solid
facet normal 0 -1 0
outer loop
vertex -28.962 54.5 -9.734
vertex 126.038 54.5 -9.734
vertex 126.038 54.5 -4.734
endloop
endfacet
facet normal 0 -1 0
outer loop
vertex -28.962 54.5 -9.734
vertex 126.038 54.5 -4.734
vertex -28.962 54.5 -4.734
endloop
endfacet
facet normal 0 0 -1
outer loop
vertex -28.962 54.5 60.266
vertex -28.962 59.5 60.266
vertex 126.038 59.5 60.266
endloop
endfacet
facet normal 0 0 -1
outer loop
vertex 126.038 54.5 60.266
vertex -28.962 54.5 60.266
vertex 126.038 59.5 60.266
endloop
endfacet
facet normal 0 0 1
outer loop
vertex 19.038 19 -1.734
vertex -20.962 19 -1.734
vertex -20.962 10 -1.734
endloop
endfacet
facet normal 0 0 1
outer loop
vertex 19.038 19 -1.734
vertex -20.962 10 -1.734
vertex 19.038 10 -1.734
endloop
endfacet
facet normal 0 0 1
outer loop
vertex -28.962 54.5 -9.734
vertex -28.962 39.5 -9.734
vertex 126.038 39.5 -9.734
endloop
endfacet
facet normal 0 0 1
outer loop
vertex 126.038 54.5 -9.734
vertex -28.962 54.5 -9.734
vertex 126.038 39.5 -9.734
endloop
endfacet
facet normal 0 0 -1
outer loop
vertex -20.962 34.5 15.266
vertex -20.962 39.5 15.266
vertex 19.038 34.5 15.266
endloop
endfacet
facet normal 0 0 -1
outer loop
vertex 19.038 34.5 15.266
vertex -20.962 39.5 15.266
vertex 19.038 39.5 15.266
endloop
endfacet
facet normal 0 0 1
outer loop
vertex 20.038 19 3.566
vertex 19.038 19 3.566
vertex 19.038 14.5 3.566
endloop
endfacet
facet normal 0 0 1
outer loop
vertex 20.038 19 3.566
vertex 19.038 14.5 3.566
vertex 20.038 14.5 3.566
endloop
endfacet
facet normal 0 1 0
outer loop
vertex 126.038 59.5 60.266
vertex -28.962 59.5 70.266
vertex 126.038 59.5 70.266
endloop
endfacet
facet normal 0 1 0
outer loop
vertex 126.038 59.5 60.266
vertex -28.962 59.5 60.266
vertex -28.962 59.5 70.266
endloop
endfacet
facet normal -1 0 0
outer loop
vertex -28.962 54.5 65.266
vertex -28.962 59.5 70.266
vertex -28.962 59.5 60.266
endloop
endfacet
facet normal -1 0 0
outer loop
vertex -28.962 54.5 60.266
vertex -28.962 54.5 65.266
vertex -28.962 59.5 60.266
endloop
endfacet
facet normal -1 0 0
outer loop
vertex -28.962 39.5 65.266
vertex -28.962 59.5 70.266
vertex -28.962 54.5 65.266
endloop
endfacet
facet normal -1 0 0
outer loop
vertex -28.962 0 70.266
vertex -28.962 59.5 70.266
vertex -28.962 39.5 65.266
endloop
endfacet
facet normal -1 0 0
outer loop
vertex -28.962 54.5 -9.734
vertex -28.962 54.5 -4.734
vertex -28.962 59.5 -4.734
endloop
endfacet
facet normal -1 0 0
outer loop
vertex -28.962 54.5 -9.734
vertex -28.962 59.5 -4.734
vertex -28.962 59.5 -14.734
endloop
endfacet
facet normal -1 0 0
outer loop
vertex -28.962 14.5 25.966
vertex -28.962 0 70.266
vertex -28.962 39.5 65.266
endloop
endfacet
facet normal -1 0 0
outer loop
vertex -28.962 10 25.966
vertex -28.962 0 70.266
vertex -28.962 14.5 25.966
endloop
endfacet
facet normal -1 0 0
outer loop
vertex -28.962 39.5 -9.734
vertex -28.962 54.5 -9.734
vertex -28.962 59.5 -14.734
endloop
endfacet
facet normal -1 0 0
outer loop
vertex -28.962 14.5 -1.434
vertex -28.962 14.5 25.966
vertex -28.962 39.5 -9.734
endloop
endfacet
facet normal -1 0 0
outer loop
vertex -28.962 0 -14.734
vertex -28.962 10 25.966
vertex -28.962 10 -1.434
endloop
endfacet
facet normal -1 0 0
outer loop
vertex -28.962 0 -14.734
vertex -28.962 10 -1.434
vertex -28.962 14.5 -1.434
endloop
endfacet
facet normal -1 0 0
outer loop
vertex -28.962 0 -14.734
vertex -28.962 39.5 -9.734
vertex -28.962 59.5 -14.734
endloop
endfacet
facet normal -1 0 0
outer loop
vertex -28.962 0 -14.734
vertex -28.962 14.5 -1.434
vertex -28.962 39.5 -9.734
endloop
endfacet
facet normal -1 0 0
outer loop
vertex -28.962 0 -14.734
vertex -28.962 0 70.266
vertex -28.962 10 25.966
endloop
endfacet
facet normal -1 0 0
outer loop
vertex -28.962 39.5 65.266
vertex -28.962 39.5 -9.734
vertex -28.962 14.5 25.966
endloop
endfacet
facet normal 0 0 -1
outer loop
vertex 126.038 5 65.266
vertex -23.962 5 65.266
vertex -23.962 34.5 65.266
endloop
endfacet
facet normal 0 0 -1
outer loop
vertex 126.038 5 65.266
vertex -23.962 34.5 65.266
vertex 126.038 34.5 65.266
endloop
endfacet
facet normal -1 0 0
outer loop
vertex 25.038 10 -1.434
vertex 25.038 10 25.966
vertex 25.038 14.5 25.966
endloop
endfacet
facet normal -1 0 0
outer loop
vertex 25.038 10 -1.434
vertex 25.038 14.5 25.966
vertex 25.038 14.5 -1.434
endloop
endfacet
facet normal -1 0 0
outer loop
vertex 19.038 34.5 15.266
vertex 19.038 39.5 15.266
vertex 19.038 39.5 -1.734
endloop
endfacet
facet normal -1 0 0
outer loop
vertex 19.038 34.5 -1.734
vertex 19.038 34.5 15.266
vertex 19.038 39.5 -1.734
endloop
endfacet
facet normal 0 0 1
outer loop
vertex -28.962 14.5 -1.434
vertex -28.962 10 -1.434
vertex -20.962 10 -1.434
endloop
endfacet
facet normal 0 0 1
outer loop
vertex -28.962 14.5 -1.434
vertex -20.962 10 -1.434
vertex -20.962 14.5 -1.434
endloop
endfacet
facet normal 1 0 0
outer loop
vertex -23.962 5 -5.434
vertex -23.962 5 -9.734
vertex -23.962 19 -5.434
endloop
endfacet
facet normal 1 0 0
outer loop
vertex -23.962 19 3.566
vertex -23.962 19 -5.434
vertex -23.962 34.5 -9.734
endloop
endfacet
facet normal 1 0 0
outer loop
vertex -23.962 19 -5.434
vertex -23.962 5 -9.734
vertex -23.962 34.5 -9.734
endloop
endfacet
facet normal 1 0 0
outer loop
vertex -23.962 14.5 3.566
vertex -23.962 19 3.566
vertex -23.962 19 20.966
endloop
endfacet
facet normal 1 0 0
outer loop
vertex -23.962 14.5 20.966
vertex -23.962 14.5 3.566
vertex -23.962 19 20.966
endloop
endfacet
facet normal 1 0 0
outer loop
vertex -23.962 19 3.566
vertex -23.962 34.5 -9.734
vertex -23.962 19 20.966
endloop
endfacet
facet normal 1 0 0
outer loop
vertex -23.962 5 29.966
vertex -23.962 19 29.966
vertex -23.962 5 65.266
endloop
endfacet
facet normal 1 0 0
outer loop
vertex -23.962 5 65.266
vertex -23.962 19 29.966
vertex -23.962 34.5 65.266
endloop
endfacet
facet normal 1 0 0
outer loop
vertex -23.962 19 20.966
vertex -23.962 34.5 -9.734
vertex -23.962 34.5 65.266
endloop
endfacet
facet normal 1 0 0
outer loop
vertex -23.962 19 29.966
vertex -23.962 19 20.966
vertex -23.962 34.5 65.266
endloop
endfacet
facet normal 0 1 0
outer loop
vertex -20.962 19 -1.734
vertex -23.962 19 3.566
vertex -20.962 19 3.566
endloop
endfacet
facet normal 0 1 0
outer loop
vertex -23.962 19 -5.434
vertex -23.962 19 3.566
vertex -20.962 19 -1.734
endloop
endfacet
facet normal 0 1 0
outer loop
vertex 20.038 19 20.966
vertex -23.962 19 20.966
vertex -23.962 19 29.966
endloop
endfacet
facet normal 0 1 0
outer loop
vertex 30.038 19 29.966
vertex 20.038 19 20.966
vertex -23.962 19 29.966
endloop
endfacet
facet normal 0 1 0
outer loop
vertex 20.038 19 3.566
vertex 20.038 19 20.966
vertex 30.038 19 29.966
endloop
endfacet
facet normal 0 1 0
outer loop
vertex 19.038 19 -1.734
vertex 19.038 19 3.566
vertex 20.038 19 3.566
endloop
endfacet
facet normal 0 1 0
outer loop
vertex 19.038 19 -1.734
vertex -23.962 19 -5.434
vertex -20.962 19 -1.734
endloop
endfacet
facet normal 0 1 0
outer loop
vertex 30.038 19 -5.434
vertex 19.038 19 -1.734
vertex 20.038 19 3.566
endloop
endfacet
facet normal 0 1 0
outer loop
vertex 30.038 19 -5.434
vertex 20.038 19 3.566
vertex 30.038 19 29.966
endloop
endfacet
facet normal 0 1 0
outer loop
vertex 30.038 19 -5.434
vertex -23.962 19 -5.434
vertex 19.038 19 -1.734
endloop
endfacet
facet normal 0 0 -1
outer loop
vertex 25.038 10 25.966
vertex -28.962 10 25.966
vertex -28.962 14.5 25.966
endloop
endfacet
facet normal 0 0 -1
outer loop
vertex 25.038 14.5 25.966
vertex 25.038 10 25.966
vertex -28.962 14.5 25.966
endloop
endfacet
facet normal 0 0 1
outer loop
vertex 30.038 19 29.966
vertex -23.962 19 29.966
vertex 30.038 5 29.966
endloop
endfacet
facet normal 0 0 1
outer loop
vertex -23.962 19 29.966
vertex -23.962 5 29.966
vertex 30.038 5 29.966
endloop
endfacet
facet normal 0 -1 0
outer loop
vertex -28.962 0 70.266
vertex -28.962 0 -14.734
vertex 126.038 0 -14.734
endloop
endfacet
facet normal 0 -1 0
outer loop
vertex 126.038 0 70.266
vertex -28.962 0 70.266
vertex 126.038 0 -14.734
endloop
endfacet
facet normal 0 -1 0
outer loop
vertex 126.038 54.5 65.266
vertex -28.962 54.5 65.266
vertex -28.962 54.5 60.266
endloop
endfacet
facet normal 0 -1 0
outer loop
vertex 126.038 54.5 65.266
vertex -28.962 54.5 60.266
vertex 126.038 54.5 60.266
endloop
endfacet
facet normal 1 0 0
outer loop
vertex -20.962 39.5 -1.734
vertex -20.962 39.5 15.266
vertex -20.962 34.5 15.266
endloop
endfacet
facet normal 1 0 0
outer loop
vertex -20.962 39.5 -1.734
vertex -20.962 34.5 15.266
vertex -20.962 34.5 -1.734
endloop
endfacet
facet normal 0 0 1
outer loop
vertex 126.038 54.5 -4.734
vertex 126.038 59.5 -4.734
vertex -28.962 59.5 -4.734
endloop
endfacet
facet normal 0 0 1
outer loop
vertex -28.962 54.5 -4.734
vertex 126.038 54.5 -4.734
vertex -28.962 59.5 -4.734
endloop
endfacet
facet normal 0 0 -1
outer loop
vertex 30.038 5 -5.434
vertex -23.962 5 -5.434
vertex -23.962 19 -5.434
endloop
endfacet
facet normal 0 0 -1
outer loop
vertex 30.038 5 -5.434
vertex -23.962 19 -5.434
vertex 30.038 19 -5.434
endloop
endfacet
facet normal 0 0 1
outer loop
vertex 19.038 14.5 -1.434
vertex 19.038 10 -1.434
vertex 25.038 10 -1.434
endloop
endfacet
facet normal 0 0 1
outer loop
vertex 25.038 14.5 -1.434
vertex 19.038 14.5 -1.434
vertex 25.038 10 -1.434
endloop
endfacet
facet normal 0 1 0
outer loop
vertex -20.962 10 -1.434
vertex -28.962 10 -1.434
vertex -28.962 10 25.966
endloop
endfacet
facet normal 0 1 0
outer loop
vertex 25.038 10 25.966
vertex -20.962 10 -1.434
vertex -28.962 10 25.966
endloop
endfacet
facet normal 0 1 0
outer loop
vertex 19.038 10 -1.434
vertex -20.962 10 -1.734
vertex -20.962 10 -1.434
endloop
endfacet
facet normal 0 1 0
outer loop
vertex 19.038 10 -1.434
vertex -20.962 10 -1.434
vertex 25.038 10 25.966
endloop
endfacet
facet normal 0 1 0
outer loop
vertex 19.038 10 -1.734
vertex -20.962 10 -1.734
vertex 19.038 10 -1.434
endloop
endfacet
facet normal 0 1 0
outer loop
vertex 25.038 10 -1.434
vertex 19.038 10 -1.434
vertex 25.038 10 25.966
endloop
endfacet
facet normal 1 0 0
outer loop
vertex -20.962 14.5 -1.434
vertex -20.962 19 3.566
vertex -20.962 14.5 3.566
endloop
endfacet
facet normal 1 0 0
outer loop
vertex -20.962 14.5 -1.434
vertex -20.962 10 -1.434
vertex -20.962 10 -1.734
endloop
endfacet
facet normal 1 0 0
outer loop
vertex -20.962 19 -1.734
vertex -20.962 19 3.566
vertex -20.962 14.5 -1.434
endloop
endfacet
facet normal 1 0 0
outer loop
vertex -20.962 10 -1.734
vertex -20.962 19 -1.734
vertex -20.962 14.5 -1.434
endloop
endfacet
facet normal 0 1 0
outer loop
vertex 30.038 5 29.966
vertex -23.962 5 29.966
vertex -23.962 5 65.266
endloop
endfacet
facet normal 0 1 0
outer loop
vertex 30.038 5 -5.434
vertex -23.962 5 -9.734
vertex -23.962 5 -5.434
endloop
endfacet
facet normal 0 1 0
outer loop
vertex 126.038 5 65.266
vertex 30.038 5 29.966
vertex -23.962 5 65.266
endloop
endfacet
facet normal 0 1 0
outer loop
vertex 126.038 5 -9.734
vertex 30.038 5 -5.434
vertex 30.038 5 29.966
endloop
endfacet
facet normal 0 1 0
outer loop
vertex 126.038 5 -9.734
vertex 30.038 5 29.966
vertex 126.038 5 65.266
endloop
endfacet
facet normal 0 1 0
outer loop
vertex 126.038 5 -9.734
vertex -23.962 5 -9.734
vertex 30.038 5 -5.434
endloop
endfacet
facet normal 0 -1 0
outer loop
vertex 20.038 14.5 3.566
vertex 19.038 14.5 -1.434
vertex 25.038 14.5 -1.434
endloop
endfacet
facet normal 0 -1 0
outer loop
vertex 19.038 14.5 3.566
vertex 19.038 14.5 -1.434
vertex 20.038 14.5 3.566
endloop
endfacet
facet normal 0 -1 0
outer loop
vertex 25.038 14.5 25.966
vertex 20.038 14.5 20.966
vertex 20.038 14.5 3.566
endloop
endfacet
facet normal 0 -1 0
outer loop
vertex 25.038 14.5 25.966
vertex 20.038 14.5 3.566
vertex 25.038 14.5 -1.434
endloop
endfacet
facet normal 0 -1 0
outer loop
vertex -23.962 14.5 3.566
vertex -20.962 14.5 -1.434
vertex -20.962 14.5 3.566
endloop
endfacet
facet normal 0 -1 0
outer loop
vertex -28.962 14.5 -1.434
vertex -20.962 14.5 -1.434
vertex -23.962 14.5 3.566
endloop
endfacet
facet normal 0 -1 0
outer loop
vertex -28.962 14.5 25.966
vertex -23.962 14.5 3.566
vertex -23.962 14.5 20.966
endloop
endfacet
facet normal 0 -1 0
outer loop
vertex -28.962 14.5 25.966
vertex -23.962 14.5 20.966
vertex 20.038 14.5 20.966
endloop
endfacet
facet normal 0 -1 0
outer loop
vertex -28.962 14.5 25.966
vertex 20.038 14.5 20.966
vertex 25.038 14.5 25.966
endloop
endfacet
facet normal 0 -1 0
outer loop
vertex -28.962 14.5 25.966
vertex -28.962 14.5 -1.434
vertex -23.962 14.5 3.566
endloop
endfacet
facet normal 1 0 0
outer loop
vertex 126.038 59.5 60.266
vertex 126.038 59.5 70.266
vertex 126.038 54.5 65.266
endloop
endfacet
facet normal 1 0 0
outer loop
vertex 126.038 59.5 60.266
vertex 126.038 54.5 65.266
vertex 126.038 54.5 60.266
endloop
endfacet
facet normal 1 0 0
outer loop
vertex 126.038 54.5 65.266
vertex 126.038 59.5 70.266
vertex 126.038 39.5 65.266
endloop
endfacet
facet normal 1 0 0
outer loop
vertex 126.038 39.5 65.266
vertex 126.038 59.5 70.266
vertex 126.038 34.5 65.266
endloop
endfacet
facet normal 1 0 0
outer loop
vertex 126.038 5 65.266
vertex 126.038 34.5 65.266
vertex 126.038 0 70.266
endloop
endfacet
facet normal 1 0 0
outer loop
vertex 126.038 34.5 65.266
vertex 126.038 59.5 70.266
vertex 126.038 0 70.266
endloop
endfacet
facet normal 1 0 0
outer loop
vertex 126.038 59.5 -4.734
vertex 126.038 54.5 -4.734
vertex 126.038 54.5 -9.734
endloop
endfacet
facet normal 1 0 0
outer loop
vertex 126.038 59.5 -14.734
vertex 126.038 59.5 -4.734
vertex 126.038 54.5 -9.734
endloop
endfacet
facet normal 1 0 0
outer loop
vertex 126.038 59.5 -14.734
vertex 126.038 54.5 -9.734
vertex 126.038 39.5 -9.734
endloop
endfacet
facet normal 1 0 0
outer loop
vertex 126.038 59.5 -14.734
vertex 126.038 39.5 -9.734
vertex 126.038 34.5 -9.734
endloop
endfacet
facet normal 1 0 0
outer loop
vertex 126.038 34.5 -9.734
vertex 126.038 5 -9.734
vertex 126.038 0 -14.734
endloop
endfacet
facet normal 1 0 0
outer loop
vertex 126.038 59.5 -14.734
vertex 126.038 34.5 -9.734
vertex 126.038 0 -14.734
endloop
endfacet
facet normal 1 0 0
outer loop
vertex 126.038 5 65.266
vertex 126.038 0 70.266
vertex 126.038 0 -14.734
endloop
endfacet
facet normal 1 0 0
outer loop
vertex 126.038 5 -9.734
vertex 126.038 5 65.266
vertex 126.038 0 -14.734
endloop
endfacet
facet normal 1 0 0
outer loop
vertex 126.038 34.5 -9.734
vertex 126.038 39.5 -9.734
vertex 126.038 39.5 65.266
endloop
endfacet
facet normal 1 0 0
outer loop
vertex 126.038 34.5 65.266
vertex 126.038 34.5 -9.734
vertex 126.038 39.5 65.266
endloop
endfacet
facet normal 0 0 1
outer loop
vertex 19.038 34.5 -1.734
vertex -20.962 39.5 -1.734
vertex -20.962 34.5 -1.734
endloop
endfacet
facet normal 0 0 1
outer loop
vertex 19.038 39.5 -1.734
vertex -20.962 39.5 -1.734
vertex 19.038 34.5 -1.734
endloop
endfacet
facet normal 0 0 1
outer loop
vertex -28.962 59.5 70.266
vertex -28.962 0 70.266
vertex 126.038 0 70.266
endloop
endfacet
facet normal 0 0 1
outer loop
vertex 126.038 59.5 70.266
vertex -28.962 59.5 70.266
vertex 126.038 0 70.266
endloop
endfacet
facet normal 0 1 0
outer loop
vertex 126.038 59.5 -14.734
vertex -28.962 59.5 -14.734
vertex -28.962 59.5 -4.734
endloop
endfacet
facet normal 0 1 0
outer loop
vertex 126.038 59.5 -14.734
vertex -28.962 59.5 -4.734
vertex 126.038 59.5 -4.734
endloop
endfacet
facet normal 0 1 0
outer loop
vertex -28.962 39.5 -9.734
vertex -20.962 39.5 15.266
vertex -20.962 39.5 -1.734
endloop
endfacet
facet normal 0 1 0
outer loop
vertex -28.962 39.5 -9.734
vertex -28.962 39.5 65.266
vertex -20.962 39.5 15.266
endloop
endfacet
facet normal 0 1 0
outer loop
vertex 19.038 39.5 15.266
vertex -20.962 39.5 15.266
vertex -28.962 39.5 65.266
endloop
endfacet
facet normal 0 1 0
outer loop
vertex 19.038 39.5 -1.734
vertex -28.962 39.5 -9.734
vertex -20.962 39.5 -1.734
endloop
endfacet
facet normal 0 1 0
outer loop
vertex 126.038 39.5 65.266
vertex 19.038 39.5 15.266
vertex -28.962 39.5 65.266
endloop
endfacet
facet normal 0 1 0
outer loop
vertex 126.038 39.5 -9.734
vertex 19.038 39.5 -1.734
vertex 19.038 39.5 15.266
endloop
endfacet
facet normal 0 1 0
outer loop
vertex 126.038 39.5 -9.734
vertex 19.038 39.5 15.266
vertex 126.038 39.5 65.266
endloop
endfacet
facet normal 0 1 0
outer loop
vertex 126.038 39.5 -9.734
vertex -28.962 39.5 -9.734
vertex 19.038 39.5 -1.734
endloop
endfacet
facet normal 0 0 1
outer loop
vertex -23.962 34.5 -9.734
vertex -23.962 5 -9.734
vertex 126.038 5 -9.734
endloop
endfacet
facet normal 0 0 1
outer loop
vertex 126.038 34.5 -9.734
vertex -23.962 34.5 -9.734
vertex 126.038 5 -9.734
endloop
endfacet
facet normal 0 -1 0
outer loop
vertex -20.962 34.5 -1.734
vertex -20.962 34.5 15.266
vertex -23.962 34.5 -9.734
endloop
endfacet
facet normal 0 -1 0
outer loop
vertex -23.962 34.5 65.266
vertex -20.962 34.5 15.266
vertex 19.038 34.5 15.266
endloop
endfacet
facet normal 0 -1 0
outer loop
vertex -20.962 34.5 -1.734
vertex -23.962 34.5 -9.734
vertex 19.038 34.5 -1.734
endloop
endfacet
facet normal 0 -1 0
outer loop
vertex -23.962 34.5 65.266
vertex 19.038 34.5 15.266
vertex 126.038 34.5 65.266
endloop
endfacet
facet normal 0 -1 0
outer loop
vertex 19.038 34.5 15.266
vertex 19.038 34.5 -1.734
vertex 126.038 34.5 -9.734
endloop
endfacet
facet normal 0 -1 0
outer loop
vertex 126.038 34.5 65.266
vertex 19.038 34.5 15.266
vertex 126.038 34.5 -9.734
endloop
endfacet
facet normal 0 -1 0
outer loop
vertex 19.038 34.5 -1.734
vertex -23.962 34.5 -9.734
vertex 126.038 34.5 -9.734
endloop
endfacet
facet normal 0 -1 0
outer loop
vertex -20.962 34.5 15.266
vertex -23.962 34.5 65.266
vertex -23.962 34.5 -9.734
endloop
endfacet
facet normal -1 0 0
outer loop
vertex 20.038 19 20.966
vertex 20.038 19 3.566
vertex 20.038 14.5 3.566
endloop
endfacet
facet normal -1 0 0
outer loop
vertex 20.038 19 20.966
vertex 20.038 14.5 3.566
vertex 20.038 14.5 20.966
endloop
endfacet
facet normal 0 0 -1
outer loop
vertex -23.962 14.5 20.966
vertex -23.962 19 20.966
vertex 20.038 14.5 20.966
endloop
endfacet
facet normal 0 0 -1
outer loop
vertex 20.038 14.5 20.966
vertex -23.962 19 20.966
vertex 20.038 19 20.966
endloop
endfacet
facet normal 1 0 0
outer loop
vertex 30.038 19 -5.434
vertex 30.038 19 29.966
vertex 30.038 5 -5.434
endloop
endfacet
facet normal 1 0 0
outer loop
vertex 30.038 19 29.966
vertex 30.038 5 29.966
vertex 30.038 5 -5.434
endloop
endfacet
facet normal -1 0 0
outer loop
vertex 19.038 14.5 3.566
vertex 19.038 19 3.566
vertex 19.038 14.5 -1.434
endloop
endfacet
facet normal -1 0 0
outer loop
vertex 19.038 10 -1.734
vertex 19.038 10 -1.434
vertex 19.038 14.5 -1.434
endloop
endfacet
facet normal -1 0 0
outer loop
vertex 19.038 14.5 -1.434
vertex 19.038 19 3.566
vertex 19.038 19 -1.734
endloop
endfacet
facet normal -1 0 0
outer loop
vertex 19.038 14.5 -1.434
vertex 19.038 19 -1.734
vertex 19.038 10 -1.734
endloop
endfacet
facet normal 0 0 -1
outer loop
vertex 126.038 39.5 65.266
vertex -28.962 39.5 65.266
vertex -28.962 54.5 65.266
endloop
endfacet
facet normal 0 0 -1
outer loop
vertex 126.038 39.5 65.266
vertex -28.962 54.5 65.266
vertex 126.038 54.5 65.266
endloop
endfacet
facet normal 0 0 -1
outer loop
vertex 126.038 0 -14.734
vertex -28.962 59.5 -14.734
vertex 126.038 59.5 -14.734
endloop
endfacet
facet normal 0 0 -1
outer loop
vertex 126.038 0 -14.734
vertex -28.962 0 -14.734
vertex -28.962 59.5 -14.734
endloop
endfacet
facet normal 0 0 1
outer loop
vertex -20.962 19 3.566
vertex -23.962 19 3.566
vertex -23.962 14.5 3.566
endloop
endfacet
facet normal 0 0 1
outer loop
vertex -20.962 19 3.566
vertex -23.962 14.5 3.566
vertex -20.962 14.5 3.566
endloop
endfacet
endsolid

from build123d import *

# Parameters (mm, degrees)
SKETCH1_W            = 155
SKETCH1_H            = 85
BOSS_EXTRUDE1_DEPTH  = 5
SKETCH2_W            = 54
SKETCH2_H            = 35.4
BOSS_EXTRUDE19_DEPTH = 5
SKETCH14_W           = 5
SKETCH14_H           = 35.4
BOSS_EXTRUDE23_DEPTH = 9
SKETCH17_W           = 49
SKETCH17_H           = 4
BOSS_EXTRUDE24_DEPTH = 9
SKETCH18_W           = 49
SKETCH18_H           = 4.5
BOSS_EXTRUDE25_DEPTH = 5
SKETCH19_W           = 17.4
SKETCH19_H           = 4.5
BOSS_EXTRUDE26_DEPTH = 5
SKETCH20_W           = 49
SKETCH20_H           = 4
BOSS_EXTRUDE27_DEPTH = 9
SKETCH21_W           = 49
SKETCH21_H           = 4.5
BOSS_EXTRUDE28_DEPTH = 9
SKETCH24_W           = 40
SKETCH24_H           = 5.3
CUT_EXTRUDE3_DEPTH   = 9
SKETCH26_W           = 155
SKETCH26_H           = 5
BOSS_EXTRUDE29_DEPTH = 54.5
SKETCH27_W           = 155
SKETCH27_H           = 5
BOSS_EXTRUDE30_DEPTH = 75
SKETCH28_W           = 155
SKETCH28_H           = 5
BOSS_EXTRUDE31_DEPTH = 54.5
SKETCH29_W           = 75
SKETCH29_H           = 34.5
BOSS_EXTRUDE32_DEPTH = 5
SKETCH30_W           = 40
SKETCH30_H           = 17
CUT_EXTRUDE4_DEPTH   = 5
SKETCH31_W           = 27.4
SKETCH31_H           = 4.5
CUT_EXTRUDE6_DEPTH   = 5
SKETCH32_W           = 155
SKETCH32_H           = 5
BOSS_EXTRUDE33_DEPTH = 10
SKETCH33_W           = 155
SKETCH33_H           = 5
BOSS_EXTRUDE34_DEPTH = 10


with BuildPart() as part:
    # Sketch1 → Boss-Extrude1 (new body)
    with BuildSketch(Plane(origin=(0, 0, 0), x_dir=(1, 0, 0), z_dir=(0, 1, 0))):
        with Locations((48.537611559, -27.765767023)):
            Rectangle(SKETCH1_W, SKETCH1_H)
    extrude(amount=BOSS_EXTRUDE1_DEPTH)

    # Sketch2 → Boss-Extrude19 (add)
    with BuildSketch(Plane(origin=(0, 5, 0), x_dir=(1, 0, 0), z_dir=(0, 1, 0))):
        with Locations((3.037611559, -12.265767023)):
            Rectangle(SKETCH2_W, SKETCH2_H)
    extrude(amount=BOSS_EXTRUDE19_DEPTH)

    # Sketch14 → Boss-Extrude23 (add)
    with BuildSketch(Plane(origin=(0, 10, 0), x_dir=(1, 0, 0), z_dir=(0, 1, 0))):
        with Locations((27.537611559, -12.265767023)):
            Rectangle(SKETCH14_W, SKETCH14_H)
    extrude(amount=BOSS_EXTRUDE23_DEPTH)

    # Sketch17 → Boss-Extrude24 (add)
    with BuildSketch(Plane(origin=(0, 10, 0), x_dir=(1, 0, 0), z_dir=(0, 1, 0))):
        with Locations((0.537611559, 3.434232977)):
            Rectangle(SKETCH17_W, SKETCH17_H)
    extrude(amount=BOSS_EXTRUDE24_DEPTH)

    # Sketch18 → Boss-Extrude25 (add)
    with BuildSketch(Plane.XY.offset(-1.434232977)):
        with Locations((0.537611559, 16.75)):
            Rectangle(SKETCH18_W, SKETCH18_H)
    extrude(amount=BOSS_EXTRUDE25_DEPTH)

    # Sketch19 → Boss-Extrude26 (add)
    with BuildSketch(Plane.ZY.offset(-25.037611559)):
        with Locations((12.265767023, 16.75)):
            Rectangle(SKETCH19_W, SKETCH19_H)
    extrude(amount=BOSS_EXTRUDE26_DEPTH)

    # Sketch20 → Boss-Extrude27 (add)
    with BuildSketch(Plane(origin=(0, 10, 0), x_dir=(1, 0, 0), z_dir=(0, 1, 0))):
        with Locations((0.537611559, -27.965767023)):
            Rectangle(SKETCH20_W, SKETCH20_H)
    extrude(amount=BOSS_EXTRUDE27_DEPTH)

    # Sketch21 → Boss-Extrude28 (add)
    with BuildSketch(Plane.XY.offset(29.965767023)):
        with Locations((0.537611559, 16.75)):
            Rectangle(SKETCH21_W, SKETCH21_H)
    extrude(amount=-BOSS_EXTRUDE28_DEPTH)

    # Sketch24 → Cut-Extrude3 (cut)
    with BuildSketch(Plane(origin=(0, 19, 0), x_dir=(1, 0, 0), z_dir=(0, 1, 0))):
        with Locations((-0.962388441, -0.915767023)):
            Rectangle(SKETCH24_W, SKETCH24_H)
    extrude(amount=-CUT_EXTRUDE3_DEPTH, mode=Mode.SUBTRACT)

    # Sketch26 → Boss-Extrude29 (add)
    with BuildSketch(Plane(origin=(0, 5, 0), x_dir=(1, 0, 0), z_dir=(0, 1, 0))):
        with Locations((48.537611559, 12.234232977)):
            Rectangle(SKETCH26_W, SKETCH26_H)
    extrude(amount=BOSS_EXTRUDE29_DEPTH)

    # Sketch27 → Boss-Extrude30 (add)
    with BuildSketch(Plane.XY.offset(-9.734232977)):
        with Locations((48.537611559, 37)):
            Rectangle(SKETCH27_W, SKETCH27_H)
    extrude(amount=BOSS_EXTRUDE30_DEPTH)

    # Sketch28 → Boss-Extrude31 (add)
    with BuildSketch(Plane(origin=(0, 5, 0), x_dir=(1, 0, 0), z_dir=(0, 1, 0))):
        with Locations((48.537611559, -67.765767023)):
            Rectangle(SKETCH28_W, SKETCH28_H)
    extrude(amount=BOSS_EXTRUDE31_DEPTH)

    # Sketch29 → Boss-Extrude32 (add)
    with BuildSketch(Plane.ZY.offset(28.962388441)):
        with Locations((27.765767023, 22.25)):
            Rectangle(SKETCH29_W, SKETCH29_H)
    extrude(amount=-BOSS_EXTRUDE32_DEPTH)

    # Sketch30 → Cut-Extrude4 (cut)
    with BuildSketch(Plane(origin=(0, 39.5, 0), x_dir=(1, 0, 0), z_dir=(0, 1, 0))):
        with Locations((-0.962388441, -6.765767023)):
            Rectangle(SKETCH30_W, SKETCH30_H)
    extrude(amount=-CUT_EXTRUDE4_DEPTH, mode=Mode.SUBTRACT)

    # Sketch31 → Cut-Extrude6 (cut)
    with BuildSketch(Plane.ZY.offset(28.962388441)):
        with Locations((12.265767023, 12.25)):
            Rectangle(SKETCH31_W, SKETCH31_H)
    extrude(amount=-CUT_EXTRUDE6_DEPTH, mode=Mode.SUBTRACT)

    # Sketch32 → Boss-Extrude33 (add)
    with BuildSketch(Plane.XY.offset(70.265767023)):
        with Locations((48.537611559, 57)):
            Rectangle(SKETCH32_W, SKETCH32_H)
    extrude(amount=-BOSS_EXTRUDE33_DEPTH)

    # Sketch33 → Boss-Extrude34 (add)
    with BuildSketch(Plane(origin=(0, 0, -14.734232977), x_dir=(-1, 0, 0), z_dir=(0, 0, -1))):
        with Locations((-48.537611559, 57)):
            Rectangle(SKETCH33_W, SKETCH33_H)
    extrude(amount=-BOSS_EXTRUDE34_DEPTH)


solid = part.part
